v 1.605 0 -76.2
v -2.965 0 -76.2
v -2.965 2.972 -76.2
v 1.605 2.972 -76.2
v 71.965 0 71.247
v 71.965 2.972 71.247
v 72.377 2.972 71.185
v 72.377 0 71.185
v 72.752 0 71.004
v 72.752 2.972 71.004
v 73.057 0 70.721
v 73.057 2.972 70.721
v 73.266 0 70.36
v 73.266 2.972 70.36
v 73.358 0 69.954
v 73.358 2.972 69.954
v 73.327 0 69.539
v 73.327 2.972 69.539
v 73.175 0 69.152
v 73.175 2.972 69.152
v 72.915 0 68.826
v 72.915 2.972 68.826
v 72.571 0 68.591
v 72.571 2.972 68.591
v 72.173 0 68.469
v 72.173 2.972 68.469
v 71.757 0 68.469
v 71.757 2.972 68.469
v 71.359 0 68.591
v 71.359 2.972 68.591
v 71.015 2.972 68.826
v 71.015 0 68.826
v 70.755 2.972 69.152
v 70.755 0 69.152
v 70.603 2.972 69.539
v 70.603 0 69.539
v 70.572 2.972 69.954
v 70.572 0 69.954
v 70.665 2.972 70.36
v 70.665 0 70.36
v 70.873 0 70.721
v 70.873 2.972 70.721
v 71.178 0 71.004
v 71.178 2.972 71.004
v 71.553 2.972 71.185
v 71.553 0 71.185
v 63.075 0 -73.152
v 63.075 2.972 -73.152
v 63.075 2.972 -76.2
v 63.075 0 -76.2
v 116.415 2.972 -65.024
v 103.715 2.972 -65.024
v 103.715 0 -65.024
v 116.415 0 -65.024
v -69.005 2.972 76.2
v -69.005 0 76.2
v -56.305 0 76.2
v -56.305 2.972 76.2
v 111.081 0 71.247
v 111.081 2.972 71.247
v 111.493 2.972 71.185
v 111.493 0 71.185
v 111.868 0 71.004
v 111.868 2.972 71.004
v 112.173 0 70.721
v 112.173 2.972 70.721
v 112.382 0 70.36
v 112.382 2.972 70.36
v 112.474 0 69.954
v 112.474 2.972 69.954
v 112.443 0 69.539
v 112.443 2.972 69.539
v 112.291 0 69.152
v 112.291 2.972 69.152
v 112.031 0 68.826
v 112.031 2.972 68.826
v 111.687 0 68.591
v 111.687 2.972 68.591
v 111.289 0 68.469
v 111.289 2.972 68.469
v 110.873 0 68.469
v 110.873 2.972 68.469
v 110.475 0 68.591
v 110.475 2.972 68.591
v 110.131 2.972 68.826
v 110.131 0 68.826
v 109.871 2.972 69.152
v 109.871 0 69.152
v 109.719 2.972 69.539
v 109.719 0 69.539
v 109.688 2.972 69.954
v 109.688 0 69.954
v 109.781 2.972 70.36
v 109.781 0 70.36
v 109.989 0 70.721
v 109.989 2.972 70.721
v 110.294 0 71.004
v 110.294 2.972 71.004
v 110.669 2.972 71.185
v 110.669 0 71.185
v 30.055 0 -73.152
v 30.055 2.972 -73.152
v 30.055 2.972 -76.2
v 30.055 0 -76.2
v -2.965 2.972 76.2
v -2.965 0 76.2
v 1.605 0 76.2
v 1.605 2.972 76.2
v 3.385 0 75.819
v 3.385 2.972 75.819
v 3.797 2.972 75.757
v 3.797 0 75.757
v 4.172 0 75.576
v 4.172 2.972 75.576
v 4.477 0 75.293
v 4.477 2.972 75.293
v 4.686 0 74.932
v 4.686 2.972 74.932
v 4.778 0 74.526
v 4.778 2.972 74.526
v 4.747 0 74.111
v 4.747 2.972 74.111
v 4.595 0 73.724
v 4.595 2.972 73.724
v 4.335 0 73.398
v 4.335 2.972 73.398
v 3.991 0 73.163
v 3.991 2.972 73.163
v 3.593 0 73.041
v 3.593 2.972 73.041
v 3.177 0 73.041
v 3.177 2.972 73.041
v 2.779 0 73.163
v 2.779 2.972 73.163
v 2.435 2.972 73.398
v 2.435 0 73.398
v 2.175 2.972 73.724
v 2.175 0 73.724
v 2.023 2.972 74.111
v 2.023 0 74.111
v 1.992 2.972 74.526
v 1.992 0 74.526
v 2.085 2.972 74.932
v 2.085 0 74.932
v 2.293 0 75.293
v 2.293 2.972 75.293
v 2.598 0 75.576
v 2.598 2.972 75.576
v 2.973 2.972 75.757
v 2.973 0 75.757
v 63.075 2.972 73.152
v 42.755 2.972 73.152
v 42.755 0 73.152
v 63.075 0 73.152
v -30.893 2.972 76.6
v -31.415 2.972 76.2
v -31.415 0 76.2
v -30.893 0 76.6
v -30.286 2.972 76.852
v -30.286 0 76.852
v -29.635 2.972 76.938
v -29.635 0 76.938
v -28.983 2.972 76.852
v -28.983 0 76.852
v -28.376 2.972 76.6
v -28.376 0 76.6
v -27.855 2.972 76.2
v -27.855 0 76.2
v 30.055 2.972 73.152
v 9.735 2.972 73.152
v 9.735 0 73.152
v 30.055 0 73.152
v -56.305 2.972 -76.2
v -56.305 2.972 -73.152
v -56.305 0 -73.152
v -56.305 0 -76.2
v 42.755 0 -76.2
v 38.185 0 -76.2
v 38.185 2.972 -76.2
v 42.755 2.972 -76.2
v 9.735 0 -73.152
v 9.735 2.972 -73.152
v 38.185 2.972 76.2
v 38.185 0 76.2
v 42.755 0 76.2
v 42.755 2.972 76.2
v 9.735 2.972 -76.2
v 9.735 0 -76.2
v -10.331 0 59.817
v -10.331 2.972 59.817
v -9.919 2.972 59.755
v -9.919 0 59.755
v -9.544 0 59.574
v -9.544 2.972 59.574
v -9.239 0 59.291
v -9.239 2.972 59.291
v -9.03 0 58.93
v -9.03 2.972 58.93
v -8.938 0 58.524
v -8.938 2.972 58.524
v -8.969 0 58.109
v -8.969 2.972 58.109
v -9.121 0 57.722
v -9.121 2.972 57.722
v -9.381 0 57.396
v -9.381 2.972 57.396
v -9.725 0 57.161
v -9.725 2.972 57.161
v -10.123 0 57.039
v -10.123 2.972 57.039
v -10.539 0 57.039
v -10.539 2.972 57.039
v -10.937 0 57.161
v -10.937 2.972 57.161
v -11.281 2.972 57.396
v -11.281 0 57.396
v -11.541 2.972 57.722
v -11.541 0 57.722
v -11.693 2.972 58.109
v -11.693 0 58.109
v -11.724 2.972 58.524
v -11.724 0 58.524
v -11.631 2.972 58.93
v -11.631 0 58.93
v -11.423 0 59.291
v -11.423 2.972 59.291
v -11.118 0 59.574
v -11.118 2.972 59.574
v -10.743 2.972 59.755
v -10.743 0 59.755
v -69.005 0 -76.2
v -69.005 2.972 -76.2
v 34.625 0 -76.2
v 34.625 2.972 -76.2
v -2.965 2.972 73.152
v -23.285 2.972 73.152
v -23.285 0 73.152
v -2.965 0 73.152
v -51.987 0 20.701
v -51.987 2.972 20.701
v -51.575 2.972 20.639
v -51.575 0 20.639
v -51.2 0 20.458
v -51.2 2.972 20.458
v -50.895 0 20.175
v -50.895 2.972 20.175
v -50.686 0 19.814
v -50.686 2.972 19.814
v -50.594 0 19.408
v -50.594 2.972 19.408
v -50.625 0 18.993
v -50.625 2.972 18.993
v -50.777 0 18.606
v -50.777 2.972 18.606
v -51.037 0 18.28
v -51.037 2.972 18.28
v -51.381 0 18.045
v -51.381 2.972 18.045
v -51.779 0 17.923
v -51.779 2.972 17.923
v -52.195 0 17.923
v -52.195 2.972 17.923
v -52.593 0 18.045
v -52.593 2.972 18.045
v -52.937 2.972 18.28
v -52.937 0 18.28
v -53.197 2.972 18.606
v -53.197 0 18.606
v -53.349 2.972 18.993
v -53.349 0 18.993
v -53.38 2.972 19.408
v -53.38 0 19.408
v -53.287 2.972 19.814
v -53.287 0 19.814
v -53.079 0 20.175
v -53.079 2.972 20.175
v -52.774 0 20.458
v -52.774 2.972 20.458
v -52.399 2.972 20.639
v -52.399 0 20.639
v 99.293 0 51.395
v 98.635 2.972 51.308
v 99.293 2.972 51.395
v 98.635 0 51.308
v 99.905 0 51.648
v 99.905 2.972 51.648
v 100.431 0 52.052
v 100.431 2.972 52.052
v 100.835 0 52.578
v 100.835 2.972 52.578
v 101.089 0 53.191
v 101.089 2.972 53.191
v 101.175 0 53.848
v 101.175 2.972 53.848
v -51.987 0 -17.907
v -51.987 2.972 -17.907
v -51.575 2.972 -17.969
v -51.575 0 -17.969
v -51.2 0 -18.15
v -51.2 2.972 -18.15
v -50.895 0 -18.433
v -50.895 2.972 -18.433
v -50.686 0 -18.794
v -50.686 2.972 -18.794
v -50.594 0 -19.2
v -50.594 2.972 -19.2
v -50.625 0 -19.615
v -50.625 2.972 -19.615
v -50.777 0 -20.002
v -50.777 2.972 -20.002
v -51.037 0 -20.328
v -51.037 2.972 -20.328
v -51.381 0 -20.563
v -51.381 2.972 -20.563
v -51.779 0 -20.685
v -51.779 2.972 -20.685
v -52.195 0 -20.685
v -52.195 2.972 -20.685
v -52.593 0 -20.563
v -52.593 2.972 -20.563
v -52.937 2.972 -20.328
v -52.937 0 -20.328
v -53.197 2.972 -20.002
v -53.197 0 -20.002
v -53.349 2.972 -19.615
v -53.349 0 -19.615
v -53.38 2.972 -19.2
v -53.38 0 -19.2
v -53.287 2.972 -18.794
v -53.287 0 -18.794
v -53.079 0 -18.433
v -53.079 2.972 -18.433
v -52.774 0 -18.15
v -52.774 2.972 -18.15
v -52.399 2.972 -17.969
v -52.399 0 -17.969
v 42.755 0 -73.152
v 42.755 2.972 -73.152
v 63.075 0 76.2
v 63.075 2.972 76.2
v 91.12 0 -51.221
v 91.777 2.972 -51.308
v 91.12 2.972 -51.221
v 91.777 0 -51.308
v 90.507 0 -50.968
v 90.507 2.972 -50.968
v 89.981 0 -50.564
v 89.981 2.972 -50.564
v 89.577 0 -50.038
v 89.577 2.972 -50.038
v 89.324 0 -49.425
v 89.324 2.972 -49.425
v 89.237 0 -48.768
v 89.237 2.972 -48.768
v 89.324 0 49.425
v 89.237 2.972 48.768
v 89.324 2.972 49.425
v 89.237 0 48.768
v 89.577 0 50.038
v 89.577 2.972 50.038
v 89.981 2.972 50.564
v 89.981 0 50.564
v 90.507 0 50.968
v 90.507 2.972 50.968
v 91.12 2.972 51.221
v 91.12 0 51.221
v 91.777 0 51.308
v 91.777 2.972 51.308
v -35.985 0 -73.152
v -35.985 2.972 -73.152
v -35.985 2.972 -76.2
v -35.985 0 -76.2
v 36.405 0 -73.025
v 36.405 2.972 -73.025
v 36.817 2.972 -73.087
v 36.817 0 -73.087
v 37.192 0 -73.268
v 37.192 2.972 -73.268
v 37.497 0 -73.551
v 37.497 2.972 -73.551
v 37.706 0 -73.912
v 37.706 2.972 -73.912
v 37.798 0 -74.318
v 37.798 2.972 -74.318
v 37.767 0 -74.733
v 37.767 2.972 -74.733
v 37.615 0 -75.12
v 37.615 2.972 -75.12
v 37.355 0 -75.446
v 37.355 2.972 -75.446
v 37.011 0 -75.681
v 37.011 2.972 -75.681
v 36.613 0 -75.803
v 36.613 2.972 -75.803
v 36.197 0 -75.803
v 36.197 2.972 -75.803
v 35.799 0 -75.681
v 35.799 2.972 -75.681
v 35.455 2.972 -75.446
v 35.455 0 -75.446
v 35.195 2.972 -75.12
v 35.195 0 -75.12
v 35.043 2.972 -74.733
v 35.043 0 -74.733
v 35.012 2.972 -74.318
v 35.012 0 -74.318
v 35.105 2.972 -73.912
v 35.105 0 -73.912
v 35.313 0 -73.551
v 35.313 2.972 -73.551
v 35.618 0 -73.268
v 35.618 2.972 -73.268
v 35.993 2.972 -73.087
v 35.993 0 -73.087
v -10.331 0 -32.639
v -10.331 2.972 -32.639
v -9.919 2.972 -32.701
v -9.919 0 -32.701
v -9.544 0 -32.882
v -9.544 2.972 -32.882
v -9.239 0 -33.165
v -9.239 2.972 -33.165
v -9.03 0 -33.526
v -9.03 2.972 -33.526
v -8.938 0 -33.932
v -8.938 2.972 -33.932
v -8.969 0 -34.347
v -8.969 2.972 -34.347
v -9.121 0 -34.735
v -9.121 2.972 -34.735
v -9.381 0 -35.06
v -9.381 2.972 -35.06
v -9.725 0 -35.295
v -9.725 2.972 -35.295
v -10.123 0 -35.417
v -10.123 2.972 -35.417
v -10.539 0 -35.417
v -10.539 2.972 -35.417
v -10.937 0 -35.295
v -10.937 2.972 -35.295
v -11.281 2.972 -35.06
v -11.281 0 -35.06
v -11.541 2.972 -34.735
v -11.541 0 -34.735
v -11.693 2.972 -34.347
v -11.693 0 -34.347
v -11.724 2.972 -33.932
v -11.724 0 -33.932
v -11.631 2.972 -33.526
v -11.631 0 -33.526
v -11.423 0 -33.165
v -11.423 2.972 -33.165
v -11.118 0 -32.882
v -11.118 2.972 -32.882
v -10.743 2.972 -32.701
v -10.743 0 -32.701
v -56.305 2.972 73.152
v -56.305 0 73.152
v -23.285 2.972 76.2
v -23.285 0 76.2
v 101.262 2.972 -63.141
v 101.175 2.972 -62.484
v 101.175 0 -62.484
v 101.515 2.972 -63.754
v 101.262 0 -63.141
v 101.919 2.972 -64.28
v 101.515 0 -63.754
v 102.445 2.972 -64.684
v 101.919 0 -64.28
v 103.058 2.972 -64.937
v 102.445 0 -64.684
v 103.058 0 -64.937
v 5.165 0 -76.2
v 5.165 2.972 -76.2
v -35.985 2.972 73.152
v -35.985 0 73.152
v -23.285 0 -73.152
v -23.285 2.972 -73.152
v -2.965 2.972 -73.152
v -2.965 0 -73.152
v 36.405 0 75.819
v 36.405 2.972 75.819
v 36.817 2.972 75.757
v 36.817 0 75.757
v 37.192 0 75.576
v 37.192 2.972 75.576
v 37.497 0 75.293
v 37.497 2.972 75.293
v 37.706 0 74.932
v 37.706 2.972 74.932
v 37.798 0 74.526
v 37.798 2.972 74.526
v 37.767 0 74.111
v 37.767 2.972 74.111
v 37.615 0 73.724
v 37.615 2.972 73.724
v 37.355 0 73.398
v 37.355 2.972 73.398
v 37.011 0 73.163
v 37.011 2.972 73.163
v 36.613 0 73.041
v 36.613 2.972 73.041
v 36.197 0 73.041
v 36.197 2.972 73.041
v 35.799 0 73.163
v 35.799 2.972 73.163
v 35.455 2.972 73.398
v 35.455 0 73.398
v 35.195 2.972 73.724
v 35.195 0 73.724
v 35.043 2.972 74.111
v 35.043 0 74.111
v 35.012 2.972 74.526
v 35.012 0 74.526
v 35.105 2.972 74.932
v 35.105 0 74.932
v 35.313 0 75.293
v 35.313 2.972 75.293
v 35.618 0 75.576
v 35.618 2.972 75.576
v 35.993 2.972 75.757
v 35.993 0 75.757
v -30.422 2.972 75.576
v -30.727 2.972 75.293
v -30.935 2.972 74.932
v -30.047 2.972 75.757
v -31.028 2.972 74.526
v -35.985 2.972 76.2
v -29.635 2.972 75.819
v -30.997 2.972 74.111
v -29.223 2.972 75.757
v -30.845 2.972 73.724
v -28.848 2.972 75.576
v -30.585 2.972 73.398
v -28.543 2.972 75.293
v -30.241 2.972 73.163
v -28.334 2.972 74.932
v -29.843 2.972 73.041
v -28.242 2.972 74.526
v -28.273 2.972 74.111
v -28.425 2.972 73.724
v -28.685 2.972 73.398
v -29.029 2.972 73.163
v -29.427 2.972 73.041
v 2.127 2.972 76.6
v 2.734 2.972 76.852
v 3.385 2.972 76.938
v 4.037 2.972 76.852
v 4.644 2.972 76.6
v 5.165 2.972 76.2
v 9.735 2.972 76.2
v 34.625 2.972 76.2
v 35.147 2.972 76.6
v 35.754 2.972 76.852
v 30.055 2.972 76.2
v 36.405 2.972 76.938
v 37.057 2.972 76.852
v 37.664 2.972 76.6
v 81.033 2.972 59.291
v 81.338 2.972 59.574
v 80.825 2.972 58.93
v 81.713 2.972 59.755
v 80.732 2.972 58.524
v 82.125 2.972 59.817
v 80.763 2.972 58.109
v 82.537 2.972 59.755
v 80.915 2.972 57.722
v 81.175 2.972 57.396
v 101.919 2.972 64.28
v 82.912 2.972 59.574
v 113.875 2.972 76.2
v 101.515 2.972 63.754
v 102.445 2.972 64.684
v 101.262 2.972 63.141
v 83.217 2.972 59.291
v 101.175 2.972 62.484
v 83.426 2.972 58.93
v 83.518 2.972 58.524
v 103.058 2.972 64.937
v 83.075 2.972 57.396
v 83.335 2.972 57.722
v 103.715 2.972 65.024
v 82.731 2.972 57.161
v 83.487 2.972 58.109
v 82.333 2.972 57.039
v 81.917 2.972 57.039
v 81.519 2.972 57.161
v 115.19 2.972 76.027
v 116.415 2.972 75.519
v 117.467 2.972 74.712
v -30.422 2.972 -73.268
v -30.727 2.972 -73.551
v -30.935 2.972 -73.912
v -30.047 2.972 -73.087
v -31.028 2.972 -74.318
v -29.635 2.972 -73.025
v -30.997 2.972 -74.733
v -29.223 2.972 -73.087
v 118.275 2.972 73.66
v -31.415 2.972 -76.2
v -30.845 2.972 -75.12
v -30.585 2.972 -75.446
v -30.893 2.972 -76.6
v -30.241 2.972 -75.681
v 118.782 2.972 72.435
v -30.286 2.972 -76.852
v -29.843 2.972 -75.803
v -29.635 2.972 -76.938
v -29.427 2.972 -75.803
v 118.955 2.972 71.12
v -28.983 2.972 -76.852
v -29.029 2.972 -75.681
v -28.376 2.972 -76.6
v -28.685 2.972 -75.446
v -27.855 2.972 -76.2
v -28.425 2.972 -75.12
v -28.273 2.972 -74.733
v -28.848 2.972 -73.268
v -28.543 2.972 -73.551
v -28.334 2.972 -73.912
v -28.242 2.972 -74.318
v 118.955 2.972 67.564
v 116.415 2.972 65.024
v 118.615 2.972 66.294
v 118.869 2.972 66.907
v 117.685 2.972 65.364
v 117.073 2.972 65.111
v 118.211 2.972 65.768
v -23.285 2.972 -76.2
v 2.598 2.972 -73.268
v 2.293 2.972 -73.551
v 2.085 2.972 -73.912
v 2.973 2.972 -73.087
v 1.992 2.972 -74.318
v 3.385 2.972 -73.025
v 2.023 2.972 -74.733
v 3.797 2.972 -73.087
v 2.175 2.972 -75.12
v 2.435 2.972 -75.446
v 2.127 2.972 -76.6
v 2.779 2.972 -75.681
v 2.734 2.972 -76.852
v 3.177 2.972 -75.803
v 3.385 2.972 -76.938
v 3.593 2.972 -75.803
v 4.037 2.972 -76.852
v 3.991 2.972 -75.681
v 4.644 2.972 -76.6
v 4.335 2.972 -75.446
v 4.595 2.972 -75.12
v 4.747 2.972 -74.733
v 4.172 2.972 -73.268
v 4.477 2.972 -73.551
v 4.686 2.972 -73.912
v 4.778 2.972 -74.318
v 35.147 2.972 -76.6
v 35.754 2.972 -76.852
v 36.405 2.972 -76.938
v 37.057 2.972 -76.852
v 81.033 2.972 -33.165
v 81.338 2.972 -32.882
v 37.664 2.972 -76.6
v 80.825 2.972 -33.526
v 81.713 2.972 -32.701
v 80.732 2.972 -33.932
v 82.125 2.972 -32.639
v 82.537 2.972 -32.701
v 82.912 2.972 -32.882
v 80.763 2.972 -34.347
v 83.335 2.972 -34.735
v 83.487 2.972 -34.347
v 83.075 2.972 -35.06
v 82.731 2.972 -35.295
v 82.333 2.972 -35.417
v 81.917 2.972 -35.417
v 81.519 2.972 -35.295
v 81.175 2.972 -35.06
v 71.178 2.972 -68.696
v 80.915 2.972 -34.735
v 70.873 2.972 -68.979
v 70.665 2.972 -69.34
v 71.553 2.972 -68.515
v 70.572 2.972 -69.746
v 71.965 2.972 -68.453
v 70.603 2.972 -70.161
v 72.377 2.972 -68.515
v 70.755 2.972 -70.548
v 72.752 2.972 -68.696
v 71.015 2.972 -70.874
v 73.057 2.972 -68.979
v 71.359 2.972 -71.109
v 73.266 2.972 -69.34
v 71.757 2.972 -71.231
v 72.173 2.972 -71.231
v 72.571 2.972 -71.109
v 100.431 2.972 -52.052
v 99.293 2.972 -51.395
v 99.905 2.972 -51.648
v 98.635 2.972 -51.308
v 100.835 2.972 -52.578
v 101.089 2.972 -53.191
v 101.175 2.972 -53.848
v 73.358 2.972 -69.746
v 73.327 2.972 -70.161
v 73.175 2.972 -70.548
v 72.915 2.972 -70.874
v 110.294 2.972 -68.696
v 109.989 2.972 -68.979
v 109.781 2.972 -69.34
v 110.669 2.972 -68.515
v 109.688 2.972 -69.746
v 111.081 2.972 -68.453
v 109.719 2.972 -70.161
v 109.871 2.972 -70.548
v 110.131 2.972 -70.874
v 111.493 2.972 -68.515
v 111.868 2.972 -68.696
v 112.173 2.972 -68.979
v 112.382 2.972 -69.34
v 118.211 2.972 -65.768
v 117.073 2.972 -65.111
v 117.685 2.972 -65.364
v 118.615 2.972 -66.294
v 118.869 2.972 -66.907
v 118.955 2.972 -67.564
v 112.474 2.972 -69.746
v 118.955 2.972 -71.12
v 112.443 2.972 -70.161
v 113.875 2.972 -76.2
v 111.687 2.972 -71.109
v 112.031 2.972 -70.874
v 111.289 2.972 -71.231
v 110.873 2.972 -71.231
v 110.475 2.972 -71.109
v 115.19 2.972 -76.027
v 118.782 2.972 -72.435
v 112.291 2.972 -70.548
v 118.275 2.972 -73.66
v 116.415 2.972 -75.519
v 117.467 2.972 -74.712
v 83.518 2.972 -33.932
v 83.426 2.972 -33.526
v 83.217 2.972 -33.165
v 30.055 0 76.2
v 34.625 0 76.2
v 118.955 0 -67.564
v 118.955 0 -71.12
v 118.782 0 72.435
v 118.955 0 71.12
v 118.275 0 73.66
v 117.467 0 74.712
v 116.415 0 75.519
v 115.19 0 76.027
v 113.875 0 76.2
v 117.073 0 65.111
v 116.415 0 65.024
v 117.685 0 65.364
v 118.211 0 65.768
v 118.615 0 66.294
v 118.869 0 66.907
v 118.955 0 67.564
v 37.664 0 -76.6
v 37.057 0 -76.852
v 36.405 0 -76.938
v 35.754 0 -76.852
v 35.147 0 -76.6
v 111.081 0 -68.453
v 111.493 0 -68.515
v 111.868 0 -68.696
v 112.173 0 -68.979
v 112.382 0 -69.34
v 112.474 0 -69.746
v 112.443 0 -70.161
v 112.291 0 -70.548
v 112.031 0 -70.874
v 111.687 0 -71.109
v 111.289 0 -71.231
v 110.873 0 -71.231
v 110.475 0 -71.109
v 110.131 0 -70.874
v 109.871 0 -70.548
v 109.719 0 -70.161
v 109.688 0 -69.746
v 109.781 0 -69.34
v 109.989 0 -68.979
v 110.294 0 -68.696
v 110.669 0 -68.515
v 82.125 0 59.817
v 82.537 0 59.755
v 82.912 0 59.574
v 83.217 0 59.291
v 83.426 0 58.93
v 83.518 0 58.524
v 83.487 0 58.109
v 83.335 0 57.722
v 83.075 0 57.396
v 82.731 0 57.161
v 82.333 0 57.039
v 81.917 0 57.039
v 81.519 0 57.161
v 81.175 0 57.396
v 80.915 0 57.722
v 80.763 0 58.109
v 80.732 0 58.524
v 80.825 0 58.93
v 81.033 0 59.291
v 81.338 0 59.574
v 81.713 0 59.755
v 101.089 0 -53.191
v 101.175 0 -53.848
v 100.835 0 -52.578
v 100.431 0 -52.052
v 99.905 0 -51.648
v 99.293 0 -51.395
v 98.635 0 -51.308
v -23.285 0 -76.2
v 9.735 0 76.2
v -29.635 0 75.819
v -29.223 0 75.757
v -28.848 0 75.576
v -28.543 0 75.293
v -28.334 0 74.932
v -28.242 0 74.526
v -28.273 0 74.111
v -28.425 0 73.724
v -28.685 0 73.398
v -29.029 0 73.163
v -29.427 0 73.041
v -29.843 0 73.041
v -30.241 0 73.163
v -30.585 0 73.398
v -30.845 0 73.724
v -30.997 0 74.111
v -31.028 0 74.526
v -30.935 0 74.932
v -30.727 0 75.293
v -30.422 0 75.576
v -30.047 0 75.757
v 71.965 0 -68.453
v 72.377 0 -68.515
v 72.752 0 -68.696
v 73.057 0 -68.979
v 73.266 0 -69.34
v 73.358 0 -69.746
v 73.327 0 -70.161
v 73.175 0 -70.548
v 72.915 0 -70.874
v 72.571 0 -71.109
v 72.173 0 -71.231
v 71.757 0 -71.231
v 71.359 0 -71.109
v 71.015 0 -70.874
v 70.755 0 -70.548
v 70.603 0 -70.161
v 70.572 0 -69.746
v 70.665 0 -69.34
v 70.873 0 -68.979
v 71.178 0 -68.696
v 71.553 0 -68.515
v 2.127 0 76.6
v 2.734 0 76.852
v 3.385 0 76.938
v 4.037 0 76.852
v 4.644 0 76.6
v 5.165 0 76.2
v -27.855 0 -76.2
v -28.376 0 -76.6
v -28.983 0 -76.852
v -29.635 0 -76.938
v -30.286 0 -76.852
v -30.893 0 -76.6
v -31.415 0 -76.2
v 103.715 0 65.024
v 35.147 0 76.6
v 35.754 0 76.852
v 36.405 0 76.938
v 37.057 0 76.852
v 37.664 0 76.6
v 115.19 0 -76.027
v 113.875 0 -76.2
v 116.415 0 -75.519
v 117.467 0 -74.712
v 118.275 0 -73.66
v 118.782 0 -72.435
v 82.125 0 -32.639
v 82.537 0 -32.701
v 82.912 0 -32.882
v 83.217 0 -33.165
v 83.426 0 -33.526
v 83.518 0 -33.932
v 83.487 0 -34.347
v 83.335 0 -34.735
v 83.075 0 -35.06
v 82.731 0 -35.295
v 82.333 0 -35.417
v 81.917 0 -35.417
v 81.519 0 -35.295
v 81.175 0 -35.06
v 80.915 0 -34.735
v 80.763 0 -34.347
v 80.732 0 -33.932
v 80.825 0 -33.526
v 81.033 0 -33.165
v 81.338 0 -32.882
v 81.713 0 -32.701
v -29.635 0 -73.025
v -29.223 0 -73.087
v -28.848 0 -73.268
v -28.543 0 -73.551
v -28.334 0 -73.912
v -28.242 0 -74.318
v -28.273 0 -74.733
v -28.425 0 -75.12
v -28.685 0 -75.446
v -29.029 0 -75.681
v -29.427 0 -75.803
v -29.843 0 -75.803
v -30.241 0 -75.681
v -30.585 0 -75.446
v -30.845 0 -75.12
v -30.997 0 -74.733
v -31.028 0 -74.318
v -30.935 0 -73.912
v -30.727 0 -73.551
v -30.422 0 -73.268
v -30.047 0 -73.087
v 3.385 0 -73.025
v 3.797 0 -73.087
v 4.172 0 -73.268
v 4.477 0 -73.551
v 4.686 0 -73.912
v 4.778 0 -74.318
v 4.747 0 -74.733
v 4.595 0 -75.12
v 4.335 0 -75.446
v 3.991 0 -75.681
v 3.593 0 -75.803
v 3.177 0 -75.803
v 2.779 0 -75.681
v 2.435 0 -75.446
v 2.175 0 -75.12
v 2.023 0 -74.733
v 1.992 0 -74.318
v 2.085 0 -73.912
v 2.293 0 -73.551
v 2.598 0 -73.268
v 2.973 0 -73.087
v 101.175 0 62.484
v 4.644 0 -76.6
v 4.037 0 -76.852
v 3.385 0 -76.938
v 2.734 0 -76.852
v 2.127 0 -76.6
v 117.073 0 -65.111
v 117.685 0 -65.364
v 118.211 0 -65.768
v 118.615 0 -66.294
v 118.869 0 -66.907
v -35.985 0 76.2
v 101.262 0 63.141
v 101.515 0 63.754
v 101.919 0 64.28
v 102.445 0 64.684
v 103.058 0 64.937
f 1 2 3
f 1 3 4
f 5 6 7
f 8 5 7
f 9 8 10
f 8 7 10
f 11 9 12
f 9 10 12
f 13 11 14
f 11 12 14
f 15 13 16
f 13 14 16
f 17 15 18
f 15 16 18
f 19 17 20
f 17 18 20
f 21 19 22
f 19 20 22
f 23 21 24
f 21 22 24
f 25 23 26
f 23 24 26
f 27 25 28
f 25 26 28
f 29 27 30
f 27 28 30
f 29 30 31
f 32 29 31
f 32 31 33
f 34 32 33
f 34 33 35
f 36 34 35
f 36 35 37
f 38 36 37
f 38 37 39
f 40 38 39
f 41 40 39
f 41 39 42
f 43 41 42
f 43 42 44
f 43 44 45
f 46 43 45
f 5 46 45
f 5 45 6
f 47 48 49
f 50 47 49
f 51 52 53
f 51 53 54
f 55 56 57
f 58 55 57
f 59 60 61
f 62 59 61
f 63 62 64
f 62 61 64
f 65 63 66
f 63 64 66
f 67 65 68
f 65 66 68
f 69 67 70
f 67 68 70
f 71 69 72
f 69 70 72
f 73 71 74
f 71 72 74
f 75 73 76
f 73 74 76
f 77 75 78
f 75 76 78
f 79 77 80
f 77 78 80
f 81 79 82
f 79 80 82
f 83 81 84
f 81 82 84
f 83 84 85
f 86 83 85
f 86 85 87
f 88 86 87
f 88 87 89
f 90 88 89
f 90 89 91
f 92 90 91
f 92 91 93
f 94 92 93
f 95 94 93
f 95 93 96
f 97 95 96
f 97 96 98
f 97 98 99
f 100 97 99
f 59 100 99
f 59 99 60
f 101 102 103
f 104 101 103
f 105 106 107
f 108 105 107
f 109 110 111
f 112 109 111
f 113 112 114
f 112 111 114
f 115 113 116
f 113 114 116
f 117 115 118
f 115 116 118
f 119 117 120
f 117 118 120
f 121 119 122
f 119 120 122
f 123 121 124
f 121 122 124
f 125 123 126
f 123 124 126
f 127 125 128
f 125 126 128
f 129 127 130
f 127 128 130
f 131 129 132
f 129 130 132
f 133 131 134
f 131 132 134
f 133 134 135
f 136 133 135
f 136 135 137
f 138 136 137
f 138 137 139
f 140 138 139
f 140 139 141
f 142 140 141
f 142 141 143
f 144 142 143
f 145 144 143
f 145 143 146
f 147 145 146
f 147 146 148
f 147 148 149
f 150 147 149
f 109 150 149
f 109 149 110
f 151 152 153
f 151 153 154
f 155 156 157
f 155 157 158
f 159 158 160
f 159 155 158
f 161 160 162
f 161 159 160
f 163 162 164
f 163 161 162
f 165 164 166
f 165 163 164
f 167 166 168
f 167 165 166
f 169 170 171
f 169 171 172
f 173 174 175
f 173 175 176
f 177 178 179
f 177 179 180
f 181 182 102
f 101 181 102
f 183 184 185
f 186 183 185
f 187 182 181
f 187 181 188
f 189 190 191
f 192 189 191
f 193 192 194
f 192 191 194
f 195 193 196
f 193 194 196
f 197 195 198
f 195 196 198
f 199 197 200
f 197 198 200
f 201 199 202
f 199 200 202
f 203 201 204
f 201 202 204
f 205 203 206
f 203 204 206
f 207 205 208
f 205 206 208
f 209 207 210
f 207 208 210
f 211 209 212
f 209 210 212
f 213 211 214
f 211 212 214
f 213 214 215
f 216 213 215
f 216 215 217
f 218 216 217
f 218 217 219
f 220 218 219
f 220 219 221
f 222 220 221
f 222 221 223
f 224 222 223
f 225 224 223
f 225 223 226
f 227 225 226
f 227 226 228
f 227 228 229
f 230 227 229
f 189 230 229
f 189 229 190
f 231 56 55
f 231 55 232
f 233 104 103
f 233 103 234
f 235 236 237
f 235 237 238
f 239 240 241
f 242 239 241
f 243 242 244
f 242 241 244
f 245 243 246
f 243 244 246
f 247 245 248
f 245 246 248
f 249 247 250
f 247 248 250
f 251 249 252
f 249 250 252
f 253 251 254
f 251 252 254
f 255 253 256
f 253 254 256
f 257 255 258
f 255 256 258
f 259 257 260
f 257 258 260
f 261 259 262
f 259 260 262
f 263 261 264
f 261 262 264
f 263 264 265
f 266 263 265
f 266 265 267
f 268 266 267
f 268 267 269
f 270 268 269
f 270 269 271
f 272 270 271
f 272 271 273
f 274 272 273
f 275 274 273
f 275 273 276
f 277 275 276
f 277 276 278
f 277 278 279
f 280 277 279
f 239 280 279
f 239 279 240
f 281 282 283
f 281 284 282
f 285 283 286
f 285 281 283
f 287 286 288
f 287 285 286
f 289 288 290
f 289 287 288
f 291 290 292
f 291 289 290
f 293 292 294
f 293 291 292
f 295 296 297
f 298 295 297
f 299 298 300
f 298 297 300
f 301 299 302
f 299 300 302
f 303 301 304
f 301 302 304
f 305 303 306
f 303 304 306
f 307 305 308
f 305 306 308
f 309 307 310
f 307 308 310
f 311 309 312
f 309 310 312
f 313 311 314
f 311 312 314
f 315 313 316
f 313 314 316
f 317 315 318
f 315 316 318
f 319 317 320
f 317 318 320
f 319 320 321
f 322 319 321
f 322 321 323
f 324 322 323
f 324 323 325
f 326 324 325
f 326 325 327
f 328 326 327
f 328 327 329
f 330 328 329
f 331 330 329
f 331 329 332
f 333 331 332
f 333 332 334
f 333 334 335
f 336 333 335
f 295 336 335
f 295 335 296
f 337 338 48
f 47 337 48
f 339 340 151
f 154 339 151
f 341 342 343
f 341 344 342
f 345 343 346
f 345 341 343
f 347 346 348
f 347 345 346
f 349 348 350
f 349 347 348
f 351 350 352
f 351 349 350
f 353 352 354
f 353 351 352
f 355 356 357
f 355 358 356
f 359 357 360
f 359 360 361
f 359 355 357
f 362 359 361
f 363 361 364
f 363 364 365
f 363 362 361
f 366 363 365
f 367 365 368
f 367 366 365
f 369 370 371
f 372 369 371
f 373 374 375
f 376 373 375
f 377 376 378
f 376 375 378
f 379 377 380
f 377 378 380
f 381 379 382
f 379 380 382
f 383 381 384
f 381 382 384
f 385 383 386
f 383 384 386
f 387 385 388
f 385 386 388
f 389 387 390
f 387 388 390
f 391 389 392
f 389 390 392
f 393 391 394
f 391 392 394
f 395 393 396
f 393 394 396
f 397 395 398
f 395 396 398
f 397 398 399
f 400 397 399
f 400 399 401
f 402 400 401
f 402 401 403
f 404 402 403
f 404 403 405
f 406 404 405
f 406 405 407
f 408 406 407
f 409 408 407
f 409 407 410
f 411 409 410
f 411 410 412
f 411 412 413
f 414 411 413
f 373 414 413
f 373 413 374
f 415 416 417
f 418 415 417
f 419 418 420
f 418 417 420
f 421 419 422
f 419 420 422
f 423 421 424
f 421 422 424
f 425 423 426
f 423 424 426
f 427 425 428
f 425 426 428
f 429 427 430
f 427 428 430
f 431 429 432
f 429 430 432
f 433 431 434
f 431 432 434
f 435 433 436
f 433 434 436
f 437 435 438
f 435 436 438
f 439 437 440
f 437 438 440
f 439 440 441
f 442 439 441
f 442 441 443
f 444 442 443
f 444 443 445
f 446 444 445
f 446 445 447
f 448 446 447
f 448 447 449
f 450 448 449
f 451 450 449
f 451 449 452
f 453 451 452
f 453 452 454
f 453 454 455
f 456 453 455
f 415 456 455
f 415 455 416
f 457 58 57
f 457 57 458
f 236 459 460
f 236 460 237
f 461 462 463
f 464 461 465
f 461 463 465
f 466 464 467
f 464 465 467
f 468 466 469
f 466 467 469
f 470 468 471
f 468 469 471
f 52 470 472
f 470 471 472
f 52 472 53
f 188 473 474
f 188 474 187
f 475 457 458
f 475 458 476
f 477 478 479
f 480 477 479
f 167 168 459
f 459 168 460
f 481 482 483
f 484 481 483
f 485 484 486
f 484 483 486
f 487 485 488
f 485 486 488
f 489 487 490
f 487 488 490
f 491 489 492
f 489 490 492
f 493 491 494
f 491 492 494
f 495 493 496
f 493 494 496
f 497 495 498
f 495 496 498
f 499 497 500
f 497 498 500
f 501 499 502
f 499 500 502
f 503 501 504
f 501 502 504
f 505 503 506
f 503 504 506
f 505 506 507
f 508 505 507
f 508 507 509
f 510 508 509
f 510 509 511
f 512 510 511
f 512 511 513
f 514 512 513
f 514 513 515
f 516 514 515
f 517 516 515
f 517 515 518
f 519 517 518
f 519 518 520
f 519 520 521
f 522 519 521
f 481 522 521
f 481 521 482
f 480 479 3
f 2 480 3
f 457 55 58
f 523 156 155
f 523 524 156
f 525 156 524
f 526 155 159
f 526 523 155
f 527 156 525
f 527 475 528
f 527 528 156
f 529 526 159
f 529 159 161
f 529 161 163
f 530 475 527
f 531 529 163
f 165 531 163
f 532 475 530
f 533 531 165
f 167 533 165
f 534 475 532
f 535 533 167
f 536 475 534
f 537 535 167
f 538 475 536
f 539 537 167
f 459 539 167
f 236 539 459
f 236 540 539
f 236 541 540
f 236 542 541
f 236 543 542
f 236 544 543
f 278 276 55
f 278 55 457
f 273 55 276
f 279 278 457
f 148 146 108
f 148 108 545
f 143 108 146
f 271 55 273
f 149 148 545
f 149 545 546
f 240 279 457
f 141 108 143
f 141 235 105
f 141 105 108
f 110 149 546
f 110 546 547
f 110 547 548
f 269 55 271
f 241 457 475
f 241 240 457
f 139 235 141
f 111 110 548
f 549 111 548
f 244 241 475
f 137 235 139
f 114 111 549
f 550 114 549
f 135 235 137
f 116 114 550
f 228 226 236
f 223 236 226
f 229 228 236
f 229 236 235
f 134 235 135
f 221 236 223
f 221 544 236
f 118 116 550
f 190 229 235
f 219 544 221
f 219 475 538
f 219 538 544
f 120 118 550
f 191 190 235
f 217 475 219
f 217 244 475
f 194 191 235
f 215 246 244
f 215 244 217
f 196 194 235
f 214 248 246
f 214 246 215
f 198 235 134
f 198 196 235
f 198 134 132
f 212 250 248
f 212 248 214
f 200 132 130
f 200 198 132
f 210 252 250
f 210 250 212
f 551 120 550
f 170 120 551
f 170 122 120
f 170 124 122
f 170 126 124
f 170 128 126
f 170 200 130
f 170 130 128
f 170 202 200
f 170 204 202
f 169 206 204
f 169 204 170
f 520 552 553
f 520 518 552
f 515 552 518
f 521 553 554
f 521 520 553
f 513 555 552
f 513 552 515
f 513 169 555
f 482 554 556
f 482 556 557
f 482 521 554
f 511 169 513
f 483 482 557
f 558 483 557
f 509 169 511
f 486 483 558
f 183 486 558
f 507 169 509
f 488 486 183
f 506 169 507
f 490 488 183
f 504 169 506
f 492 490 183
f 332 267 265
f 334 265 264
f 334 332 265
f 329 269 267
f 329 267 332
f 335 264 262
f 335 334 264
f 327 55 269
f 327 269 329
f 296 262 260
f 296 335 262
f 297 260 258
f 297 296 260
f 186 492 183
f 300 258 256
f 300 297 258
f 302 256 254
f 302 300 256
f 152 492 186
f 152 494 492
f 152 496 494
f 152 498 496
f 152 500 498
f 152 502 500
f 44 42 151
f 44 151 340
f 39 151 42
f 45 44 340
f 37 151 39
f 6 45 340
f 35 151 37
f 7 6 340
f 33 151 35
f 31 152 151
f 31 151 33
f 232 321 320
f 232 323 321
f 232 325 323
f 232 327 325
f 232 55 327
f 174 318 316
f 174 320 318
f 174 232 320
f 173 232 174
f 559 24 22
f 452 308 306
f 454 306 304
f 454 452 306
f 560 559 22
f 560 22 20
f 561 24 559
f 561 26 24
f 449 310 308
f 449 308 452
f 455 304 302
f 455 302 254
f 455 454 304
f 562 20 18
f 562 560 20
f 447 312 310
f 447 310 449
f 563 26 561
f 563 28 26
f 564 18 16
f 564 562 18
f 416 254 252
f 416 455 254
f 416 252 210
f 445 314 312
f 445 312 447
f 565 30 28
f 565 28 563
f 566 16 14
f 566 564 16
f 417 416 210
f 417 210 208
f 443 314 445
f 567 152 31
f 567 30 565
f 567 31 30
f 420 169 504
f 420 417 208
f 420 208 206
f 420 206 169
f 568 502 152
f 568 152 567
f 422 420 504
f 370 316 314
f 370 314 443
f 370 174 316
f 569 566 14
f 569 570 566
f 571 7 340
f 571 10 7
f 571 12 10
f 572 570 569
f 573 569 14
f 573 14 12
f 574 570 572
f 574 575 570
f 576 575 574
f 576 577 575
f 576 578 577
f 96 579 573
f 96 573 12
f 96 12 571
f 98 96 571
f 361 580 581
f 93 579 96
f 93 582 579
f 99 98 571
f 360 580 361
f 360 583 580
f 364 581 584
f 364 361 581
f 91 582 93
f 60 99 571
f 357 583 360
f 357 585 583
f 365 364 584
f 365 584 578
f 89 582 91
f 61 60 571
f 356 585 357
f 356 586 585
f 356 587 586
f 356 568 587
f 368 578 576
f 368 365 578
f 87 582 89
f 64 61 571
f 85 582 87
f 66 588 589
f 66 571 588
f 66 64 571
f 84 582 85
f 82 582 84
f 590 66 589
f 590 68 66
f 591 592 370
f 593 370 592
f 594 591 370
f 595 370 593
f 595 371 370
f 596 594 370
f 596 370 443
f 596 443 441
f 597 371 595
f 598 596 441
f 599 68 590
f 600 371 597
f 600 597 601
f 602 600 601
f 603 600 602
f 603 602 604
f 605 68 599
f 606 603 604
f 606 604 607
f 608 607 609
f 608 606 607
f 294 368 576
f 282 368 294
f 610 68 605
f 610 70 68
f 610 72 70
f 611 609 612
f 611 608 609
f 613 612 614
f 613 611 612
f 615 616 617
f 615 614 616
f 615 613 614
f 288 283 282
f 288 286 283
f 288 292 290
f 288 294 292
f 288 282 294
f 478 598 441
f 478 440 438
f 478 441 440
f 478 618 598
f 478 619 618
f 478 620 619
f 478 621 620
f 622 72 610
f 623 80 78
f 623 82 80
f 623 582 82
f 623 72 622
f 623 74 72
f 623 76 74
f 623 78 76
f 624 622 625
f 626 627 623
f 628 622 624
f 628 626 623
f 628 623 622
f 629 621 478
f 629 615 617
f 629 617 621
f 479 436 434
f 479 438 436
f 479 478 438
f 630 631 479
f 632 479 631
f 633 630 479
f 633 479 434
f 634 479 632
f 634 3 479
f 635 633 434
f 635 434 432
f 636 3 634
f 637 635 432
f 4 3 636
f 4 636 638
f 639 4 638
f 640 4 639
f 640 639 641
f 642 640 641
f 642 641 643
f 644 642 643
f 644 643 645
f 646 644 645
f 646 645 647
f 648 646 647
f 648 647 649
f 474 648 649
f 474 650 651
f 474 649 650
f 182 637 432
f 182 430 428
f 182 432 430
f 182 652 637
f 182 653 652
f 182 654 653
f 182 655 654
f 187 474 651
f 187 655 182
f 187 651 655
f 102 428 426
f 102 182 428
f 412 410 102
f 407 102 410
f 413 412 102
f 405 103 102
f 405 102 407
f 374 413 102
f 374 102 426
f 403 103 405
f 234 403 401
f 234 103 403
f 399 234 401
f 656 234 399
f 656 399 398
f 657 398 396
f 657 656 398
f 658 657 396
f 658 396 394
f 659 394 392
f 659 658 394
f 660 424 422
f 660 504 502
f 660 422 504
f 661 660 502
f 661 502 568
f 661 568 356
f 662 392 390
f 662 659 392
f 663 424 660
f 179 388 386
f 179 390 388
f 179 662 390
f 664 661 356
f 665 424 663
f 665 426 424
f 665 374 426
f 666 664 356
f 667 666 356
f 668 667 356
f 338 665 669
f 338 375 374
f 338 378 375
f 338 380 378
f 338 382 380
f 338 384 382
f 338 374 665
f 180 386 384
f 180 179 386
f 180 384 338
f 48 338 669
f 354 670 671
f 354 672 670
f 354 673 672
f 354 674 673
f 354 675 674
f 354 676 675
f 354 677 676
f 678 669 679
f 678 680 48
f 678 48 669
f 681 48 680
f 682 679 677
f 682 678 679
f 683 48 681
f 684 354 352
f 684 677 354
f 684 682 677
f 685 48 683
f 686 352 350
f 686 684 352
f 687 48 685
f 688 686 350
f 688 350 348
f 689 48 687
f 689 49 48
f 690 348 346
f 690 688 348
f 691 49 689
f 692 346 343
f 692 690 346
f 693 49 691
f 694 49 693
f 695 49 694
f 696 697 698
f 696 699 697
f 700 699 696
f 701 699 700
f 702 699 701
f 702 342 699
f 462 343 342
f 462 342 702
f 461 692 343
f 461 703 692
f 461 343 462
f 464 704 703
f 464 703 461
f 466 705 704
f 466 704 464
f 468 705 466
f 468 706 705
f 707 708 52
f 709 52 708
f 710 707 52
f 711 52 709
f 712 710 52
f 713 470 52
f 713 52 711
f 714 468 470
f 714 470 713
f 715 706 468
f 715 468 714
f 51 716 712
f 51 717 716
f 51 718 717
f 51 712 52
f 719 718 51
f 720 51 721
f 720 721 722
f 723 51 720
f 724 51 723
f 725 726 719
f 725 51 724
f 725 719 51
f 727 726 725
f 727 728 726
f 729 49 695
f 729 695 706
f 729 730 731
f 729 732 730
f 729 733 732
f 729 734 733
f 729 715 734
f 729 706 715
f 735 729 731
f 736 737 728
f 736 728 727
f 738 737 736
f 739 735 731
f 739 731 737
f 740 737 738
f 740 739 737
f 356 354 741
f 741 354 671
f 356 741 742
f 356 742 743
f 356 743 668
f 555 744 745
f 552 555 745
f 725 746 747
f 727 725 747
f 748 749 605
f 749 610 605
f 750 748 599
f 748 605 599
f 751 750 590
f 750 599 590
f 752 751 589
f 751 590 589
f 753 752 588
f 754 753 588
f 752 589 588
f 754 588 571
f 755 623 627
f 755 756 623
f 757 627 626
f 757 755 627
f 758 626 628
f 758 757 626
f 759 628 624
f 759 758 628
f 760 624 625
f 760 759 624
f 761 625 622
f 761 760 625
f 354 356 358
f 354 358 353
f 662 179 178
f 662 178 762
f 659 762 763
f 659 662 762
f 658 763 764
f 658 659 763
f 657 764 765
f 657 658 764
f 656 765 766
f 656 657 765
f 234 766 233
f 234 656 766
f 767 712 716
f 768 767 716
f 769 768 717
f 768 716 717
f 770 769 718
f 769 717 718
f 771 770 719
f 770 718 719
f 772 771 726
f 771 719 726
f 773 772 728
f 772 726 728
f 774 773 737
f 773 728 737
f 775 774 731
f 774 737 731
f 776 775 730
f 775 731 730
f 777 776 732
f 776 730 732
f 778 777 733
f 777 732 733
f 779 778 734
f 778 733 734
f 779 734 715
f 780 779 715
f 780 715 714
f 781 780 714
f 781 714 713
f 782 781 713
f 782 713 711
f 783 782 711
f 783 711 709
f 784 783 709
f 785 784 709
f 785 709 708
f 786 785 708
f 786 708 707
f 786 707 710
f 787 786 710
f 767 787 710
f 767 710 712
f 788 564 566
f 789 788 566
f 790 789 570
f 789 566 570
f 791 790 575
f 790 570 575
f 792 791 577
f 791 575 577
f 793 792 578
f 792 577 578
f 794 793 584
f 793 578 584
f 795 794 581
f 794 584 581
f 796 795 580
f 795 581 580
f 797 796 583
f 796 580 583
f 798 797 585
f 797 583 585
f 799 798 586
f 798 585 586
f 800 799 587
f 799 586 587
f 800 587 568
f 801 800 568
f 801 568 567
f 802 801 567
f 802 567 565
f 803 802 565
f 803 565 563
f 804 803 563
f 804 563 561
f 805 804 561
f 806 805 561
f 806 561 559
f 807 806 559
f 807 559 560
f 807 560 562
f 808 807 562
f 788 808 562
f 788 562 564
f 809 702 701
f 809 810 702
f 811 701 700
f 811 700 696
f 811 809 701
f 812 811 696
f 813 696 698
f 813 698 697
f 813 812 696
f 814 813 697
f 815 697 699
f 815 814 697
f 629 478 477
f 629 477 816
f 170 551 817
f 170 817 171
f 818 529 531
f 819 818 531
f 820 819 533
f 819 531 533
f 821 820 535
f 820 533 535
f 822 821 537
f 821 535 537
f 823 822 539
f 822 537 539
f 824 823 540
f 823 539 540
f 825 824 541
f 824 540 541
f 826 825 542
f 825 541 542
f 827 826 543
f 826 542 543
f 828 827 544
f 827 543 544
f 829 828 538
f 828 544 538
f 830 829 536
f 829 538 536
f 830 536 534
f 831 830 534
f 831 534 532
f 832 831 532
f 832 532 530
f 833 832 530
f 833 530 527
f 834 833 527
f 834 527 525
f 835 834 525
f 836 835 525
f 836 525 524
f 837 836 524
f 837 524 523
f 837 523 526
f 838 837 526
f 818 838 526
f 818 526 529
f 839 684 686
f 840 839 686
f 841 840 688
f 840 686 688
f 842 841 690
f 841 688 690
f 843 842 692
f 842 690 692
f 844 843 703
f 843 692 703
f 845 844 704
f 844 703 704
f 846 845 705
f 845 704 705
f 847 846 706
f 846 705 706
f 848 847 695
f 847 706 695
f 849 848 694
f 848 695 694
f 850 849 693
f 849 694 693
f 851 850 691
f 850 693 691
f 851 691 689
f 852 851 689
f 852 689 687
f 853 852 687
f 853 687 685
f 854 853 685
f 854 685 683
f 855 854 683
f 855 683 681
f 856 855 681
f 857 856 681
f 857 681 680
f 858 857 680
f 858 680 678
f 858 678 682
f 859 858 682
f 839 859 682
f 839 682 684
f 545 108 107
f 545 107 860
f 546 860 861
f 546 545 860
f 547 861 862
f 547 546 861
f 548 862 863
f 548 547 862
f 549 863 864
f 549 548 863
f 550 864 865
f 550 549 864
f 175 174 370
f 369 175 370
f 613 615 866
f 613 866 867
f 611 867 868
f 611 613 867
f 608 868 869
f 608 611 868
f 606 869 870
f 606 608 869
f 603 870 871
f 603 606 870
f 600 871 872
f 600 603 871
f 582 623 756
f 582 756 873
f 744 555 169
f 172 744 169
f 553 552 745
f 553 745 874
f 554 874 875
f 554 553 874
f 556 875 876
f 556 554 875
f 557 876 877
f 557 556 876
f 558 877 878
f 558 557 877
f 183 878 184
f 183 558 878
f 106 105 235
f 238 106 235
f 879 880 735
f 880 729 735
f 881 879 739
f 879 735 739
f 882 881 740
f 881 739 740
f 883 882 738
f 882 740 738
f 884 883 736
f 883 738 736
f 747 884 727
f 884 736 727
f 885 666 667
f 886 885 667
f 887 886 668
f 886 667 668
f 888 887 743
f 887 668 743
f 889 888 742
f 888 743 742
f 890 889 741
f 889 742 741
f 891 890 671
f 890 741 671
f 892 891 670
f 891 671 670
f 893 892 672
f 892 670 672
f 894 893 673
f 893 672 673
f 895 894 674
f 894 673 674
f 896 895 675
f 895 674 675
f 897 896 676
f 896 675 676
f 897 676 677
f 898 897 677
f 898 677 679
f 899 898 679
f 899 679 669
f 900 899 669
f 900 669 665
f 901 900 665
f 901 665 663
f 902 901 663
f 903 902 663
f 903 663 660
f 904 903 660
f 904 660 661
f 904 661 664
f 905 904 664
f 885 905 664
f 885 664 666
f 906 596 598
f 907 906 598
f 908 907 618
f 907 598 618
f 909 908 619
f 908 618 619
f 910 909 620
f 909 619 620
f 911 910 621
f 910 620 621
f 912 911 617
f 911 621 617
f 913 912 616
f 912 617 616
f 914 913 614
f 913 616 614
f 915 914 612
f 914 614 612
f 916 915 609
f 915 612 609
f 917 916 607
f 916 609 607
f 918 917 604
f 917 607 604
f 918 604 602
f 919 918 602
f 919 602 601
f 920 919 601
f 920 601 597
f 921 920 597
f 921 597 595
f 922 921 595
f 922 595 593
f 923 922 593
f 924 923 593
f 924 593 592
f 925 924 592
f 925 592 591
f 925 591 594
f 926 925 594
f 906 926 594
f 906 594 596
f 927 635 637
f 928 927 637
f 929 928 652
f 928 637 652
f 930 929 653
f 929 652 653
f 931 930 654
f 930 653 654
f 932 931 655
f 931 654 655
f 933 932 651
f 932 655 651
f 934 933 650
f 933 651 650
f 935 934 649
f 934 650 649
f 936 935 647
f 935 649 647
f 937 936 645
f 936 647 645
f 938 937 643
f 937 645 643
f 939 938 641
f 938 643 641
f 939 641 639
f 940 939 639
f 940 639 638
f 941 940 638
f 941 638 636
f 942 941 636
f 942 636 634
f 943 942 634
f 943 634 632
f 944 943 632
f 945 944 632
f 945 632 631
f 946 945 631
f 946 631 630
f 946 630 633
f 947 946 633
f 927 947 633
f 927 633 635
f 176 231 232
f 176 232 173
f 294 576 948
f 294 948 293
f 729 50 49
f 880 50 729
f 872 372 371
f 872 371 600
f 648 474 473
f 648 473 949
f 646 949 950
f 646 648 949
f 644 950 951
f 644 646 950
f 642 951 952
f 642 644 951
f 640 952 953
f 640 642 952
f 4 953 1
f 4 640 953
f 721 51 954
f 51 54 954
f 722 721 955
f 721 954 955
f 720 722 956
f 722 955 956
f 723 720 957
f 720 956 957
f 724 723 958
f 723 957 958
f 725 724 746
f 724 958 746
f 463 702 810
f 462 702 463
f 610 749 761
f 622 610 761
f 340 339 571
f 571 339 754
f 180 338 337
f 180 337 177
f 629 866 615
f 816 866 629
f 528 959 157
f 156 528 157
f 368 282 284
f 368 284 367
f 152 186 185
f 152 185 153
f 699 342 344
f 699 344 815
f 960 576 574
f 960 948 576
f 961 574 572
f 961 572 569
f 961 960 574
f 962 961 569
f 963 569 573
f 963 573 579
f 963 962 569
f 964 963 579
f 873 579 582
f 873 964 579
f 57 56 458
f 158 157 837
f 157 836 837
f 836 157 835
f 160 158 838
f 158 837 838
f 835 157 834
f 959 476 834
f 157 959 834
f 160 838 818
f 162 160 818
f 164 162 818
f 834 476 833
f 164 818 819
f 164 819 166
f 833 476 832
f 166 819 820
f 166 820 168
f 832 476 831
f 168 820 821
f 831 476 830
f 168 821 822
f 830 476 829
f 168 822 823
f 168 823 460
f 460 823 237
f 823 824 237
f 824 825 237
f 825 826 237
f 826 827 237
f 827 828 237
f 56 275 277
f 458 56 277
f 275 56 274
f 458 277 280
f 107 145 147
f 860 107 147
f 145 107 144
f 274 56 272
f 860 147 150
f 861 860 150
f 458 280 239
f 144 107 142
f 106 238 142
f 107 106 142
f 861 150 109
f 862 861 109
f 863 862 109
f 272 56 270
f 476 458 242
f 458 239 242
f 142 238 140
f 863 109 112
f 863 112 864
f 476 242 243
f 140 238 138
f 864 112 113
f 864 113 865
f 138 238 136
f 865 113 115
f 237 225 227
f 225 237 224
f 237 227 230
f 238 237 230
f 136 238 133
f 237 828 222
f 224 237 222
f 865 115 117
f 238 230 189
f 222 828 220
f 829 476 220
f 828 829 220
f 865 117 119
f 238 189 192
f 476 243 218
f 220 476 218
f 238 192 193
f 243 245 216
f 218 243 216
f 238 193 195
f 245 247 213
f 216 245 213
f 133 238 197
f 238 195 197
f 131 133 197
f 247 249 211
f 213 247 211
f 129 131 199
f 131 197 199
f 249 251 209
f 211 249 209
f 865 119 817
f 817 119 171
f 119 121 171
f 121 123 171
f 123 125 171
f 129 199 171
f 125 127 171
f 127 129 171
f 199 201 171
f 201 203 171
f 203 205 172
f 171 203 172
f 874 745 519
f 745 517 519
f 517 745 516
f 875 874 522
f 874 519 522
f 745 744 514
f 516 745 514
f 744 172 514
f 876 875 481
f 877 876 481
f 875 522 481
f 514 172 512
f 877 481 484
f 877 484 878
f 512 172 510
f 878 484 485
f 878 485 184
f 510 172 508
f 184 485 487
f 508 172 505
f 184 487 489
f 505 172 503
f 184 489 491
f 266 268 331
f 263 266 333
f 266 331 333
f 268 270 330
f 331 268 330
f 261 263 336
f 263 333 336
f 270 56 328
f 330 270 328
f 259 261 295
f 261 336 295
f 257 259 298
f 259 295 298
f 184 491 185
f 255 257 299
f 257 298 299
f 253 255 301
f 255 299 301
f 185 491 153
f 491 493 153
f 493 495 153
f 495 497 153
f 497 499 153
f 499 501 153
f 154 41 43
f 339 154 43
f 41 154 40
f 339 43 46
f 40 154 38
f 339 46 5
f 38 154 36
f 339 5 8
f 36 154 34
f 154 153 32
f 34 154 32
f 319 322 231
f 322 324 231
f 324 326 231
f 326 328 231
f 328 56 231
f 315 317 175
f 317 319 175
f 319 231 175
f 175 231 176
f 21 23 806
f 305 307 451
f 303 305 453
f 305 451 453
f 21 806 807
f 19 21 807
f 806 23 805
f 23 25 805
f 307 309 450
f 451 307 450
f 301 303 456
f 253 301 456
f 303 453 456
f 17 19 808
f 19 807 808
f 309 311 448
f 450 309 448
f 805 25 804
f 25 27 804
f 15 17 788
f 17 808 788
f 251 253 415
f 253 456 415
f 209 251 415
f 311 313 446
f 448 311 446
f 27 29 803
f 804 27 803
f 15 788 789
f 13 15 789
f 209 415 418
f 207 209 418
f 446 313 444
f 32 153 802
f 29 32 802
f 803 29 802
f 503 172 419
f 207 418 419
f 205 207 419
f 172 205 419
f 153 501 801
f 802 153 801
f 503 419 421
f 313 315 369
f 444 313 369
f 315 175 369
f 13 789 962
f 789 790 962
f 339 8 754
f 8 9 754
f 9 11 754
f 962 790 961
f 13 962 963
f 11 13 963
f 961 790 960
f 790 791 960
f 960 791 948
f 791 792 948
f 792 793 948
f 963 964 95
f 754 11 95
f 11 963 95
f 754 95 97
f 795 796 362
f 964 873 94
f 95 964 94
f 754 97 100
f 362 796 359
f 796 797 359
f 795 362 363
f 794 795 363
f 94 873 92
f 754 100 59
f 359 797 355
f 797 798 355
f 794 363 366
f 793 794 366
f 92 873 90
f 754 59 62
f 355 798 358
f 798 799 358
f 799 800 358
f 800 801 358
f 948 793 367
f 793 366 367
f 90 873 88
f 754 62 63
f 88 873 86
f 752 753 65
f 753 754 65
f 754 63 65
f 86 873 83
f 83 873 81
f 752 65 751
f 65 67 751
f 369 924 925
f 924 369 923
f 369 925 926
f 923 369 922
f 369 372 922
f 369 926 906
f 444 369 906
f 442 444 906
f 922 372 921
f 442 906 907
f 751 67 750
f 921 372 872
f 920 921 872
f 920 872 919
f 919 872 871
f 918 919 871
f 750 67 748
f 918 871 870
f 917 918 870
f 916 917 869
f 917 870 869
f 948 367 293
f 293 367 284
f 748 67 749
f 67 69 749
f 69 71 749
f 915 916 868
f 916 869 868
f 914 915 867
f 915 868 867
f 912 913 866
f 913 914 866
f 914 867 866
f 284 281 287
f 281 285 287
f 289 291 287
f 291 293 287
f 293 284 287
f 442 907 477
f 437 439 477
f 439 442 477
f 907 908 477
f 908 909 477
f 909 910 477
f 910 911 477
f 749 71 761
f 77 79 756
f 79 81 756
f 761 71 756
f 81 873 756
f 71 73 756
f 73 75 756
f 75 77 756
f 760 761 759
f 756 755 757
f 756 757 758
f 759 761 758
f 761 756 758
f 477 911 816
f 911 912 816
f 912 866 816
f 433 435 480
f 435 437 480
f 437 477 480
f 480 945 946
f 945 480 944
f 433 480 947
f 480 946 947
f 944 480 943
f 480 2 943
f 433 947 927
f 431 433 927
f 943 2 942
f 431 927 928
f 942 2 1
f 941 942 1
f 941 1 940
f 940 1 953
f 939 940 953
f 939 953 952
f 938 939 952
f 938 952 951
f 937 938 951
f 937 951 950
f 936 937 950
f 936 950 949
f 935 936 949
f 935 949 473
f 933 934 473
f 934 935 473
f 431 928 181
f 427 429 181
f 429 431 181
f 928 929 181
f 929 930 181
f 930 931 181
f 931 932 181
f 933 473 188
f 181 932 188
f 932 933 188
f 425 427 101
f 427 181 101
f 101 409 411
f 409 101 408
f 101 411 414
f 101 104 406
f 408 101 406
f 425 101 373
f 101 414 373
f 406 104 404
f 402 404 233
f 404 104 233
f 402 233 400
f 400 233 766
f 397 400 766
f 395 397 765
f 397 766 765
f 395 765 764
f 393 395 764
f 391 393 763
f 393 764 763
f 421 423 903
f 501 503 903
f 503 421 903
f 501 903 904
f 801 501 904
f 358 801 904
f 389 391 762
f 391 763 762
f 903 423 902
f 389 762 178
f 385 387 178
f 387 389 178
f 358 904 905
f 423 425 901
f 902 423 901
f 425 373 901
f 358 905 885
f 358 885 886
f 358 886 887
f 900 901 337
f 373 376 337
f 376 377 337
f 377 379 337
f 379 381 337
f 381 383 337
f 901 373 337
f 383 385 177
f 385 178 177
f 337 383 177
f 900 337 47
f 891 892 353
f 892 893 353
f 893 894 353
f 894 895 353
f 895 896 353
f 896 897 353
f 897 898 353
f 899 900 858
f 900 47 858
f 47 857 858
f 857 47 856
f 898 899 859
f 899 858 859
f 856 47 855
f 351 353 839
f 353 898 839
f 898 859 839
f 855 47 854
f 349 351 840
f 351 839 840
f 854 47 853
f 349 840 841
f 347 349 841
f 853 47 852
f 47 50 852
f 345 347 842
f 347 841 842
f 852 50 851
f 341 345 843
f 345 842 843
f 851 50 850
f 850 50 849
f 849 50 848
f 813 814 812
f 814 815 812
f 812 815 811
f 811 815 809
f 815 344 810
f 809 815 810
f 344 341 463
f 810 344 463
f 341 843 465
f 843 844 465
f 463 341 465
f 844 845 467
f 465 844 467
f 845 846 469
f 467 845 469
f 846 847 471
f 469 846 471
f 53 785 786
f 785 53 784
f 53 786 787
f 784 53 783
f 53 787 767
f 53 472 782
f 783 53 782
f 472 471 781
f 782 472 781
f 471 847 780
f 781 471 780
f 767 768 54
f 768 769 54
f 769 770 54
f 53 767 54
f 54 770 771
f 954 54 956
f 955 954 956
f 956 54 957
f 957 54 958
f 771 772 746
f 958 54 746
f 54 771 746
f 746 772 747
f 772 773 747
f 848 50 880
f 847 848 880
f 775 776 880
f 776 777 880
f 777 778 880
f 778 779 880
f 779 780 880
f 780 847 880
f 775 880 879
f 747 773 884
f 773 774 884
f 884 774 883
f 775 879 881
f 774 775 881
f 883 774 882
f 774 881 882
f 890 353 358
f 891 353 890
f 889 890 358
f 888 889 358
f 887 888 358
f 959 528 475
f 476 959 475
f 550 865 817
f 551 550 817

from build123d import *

# Parameters (mm, degrees)
SKETCH2_W           = 187.96
SKETCH2_H           = 152.4
BOSS_EXTRUDE1_DEPTH = 2.9718
SKETCH4_W           = 20.32
SKETCH4_H           = 3.048
SKETCH4_R           = 1.397
CUT_EXTRUDE1_DEPTH  = 5.08
BOSS_EXTRUDE2_DEPTH = 2.9718
FILLET1_R           = 5.08
CUT_EXTRUDE2_DEPTH  = 5.08
FILLET2_R           = 2.54
FILLET3_R           = 2.54
SKETCH7_R           = 1.397
CUT_EXTRUDE3_DEPTH  = 5.08
FILLET5_R           = 2.54
FILLET6_R           = 2.54


with BuildPart() as part:
    # Sketch2 → Boss-Extrude1 (new body)
    with BuildSketch(Plane(origin=(0, 0, 0), x_dir=(1, 0, 0), z_dir=(0, 1, 0))):
        with Locations((24.975168434, 0)):
            Rectangle(SKETCH2_W, SKETCH2_H)
    extrude(amount=BOSS_EXTRUDE1_DEPTH)

    # Sketch4 → Cut-Extrude1 (cut)
    with BuildSketch(Plane(origin=(0, 2.9718, 0), x_dir=(1, 0, 0), z_dir=(0, 1, 0))):
        with Locations((-46.144831566, -74.676)):
            Rectangle(SKETCH4_W, SKETCH4_H)
        with Locations((-46.144831566, 74.676)):
            Rectangle(SKETCH4_W, SKETCH4_H)
        with Locations((-13.124831566, -74.676)):
            Rectangle(SKETCH4_W, SKETCH4_H)
        with Locations((-13.124831566, 74.676)):
            Rectangle(SKETCH4_W, SKETCH4_H)
        with Locations((19.895168434, -74.676)):
            Rectangle(SKETCH4_W, SKETCH4_H)
        with Locations((19.895168434, 74.676)):
            Rectangle(SKETCH4_W, SKETCH4_H)
        with Locations((52.915168434, -74.676)):
            Rectangle(SKETCH4_W, SKETCH4_H)
        with Locations((52.915168434, 74.676)):
            Rectangle(SKETCH4_W, SKETCH4_H)
        with Locations(Location((82.125168434, -58.42, 0), (0, 0, 270))):
            Circle(SKETCH4_R)
        with Locations(Location((-10.330831566, -58.42, 0), (0, 0, 270))):
            Circle(SKETCH4_R)
        with Locations(Location((36.405168434, 74.422, 0), (0, 0, 270))):
            Circle(SKETCH4_R)
        with Locations(Location((3.385168434, 74.422, 0), (0, 0, 270))):
            Circle(SKETCH4_R)
        with Locations(Location((-29.634831566, 74.422, 0), (0, 0, 270))):
            Circle(SKETCH4_R)
        with Locations(Location((36.405168434, -74.422, 0), (0, 0, 270))):
            Circle(SKETCH4_R)
        with Locations(Location((3.385168434, -74.422, 0), (0, 0, 270))):
            Circle(SKETCH4_R)
        with Locations(Location((-29.634831566, -74.422, 0), (0, 0, 270))):
            Circle(SKETCH4_R)
        with Locations(Location((111.081256794, 69.85, 0), (0, 0, 270))):
            Circle(SKETCH4_R)
        with Locations(Location((111.081256794, -69.85, 0), (0, 0, 270))):
            Circle(SKETCH4_R)
        with Locations(Location((71.965256794, 69.85, 0), (0, 0, 270))):
            Circle(SKETCH4_R)
        with Locations(Location((71.965256794, -69.85, 0), (0, 0, 270))):
            Circle(SKETCH4_R)
        with Locations(Location((82.125168434, 34.036, 0), (0, 0, 270))):
            Circle(SKETCH4_R)
        with Locations(Location((-10.330831566, 34.036, 0), (0, 0, 270))):
            Circle(SKETCH4_R)
    extrude(amount=-CUT_EXTRUDE1_DEPTH, mode=Mode.SUBTRACT)

    # Sketch5 → Boss-Extrude2 (add)
    with BuildSketch(Plane(origin=(0, 2.9718, 0), x_dir=(1, 0, 0), z_dir=(0, 1, 0))):
        with BuildLine():
            ThreePointArc((38.185030781, 76.2), (36.405168434, 76.937788936), (34.625306088, 76.2))
            Line((34.625306088, 76.2), (38.185030781, 76.2))
        make_face()
        with BuildLine():
            Line((1.605306088, 76.2), (5.165030781, 76.2))
            ThreePointArc((5.165030781, 76.2), (3.385168434, 76.937788936), (1.605306088, 76.2))
        make_face()
        with BuildLine():
            Line((-31.414693912, 76.2), (-27.854969219, 76.2))
            ThreePointArc((-27.854969219, 76.2), (-29.634831566, 76.937788936), (-31.414693912, 76.2))
        make_face()
        with BuildLine():
            ThreePointArc((-31.414693912, -76.2), (-29.634831566, -76.937788936), (-27.854969219, -76.2))
            Line((-27.854969219, -76.2), (-31.414693912, -76.2))
        make_face()
        with BuildLine():
            ThreePointArc((1.605306088, -76.2), (3.385168434, -76.937788936), (5.165030781, -76.2))
            Line((5.165030781, -76.2), (1.605306088, -76.2))
        make_face()
        with BuildLine():
            ThreePointArc((34.625306088, -76.2), (36.405168434, -76.937788936), (38.185030781, -76.2))
            Line((38.185030781, -76.2), (34.625306088, -76.2))
        make_face()
    extrude(amount=-BOSS_EXTRUDE2_DEPTH)

    # Fillet1
    fillet1_edges = [part.edges().sort_by_distance(p)[0] for p in [
        (118.955168434, 1.4859, 76.2),
        (118.955168434, 1.4859, -76.2),
    ]]
    fillet(fillet1_edges, radius=FILLET1_R)

    # Sketch6 → Cut-Extrude2 (cut)
    with BuildSketch(Plane(origin=(0, 2.9718, 0), x_dir=(1, 0, 0), z_dir=(0, 1, 0))):
        Polygon((118.955168434, -98.380031514), (118.955168434, -65.024), (101.175168434, -65.024), (101.175168434, -51.308), (89.237168434, -51.308), (89.237168434, 51.308), (101.175168434, 51.308), (101.175168434, 65.024), (118.955168434, 65.024), (118.955168434, 98.380031514), (174.761445674, 98.380031514), (174.761445674, -98.380031514), align=None)
    extrude(amount=-CUT_EXTRUDE2_DEPTH, mode=Mode.SUBTRACT)

    # Fillet2
    fillet2_edges = [part.edges().sort_by_distance(p)[0] for p in [
        (101.175168434, 1.4859, -51.308),
    ]]
    fillet(fillet2_edges, radius=FILLET2_R)

    # Fillet3
    fillet3_edges = [part.edges().sort_by_distance(p)[0] for p in [
        (101.175168434, 1.4859, 65.024),
        (101.175168434, 1.4859, 51.308),
        (118.955168434, 1.4859, 65.024),
        (101.175168434, 1.4859, -65.024),
        (118.955168434, 1.4859, -65.024),
    ]]
    fillet(fillet3_edges, radius=FILLET3_R)

    # Sketch7 → Cut-Extrude3 (cut)
    with BuildSketch(Plane(origin=(0, 2.9718, 0), x_dir=(1, 0, 0), z_dir=(0, 1, 0))):
        with Locations(Location((-51.986831566, 19.304, 0), (0, 0, 270))):
            Circle(SKETCH7_R)
        with Locations(Location((-51.986831566, -19.304, 0), (0, 0, 270))):
            Circle(SKETCH7_R)
    extrude(amount=-CUT_EXTRUDE3_DEPTH, mode=Mode.SUBTRACT)

    # Fillet5
    fillet5_edges = [part.edges().sort_by_distance(p)[0] for p in [
        (89.237168434, 1.4859, -51.308),
    ]]
    fillet(fillet5_edges, radius=FILLET5_R)

    # Fillet6
    fillet6_edges = [part.edges().sort_by_distance(p)[0] for p in [
        (89.237168434, 1.4859, 51.308),
    ]]
    fillet(fillet6_edges, radius=FILLET6_R)


solid = part.part
